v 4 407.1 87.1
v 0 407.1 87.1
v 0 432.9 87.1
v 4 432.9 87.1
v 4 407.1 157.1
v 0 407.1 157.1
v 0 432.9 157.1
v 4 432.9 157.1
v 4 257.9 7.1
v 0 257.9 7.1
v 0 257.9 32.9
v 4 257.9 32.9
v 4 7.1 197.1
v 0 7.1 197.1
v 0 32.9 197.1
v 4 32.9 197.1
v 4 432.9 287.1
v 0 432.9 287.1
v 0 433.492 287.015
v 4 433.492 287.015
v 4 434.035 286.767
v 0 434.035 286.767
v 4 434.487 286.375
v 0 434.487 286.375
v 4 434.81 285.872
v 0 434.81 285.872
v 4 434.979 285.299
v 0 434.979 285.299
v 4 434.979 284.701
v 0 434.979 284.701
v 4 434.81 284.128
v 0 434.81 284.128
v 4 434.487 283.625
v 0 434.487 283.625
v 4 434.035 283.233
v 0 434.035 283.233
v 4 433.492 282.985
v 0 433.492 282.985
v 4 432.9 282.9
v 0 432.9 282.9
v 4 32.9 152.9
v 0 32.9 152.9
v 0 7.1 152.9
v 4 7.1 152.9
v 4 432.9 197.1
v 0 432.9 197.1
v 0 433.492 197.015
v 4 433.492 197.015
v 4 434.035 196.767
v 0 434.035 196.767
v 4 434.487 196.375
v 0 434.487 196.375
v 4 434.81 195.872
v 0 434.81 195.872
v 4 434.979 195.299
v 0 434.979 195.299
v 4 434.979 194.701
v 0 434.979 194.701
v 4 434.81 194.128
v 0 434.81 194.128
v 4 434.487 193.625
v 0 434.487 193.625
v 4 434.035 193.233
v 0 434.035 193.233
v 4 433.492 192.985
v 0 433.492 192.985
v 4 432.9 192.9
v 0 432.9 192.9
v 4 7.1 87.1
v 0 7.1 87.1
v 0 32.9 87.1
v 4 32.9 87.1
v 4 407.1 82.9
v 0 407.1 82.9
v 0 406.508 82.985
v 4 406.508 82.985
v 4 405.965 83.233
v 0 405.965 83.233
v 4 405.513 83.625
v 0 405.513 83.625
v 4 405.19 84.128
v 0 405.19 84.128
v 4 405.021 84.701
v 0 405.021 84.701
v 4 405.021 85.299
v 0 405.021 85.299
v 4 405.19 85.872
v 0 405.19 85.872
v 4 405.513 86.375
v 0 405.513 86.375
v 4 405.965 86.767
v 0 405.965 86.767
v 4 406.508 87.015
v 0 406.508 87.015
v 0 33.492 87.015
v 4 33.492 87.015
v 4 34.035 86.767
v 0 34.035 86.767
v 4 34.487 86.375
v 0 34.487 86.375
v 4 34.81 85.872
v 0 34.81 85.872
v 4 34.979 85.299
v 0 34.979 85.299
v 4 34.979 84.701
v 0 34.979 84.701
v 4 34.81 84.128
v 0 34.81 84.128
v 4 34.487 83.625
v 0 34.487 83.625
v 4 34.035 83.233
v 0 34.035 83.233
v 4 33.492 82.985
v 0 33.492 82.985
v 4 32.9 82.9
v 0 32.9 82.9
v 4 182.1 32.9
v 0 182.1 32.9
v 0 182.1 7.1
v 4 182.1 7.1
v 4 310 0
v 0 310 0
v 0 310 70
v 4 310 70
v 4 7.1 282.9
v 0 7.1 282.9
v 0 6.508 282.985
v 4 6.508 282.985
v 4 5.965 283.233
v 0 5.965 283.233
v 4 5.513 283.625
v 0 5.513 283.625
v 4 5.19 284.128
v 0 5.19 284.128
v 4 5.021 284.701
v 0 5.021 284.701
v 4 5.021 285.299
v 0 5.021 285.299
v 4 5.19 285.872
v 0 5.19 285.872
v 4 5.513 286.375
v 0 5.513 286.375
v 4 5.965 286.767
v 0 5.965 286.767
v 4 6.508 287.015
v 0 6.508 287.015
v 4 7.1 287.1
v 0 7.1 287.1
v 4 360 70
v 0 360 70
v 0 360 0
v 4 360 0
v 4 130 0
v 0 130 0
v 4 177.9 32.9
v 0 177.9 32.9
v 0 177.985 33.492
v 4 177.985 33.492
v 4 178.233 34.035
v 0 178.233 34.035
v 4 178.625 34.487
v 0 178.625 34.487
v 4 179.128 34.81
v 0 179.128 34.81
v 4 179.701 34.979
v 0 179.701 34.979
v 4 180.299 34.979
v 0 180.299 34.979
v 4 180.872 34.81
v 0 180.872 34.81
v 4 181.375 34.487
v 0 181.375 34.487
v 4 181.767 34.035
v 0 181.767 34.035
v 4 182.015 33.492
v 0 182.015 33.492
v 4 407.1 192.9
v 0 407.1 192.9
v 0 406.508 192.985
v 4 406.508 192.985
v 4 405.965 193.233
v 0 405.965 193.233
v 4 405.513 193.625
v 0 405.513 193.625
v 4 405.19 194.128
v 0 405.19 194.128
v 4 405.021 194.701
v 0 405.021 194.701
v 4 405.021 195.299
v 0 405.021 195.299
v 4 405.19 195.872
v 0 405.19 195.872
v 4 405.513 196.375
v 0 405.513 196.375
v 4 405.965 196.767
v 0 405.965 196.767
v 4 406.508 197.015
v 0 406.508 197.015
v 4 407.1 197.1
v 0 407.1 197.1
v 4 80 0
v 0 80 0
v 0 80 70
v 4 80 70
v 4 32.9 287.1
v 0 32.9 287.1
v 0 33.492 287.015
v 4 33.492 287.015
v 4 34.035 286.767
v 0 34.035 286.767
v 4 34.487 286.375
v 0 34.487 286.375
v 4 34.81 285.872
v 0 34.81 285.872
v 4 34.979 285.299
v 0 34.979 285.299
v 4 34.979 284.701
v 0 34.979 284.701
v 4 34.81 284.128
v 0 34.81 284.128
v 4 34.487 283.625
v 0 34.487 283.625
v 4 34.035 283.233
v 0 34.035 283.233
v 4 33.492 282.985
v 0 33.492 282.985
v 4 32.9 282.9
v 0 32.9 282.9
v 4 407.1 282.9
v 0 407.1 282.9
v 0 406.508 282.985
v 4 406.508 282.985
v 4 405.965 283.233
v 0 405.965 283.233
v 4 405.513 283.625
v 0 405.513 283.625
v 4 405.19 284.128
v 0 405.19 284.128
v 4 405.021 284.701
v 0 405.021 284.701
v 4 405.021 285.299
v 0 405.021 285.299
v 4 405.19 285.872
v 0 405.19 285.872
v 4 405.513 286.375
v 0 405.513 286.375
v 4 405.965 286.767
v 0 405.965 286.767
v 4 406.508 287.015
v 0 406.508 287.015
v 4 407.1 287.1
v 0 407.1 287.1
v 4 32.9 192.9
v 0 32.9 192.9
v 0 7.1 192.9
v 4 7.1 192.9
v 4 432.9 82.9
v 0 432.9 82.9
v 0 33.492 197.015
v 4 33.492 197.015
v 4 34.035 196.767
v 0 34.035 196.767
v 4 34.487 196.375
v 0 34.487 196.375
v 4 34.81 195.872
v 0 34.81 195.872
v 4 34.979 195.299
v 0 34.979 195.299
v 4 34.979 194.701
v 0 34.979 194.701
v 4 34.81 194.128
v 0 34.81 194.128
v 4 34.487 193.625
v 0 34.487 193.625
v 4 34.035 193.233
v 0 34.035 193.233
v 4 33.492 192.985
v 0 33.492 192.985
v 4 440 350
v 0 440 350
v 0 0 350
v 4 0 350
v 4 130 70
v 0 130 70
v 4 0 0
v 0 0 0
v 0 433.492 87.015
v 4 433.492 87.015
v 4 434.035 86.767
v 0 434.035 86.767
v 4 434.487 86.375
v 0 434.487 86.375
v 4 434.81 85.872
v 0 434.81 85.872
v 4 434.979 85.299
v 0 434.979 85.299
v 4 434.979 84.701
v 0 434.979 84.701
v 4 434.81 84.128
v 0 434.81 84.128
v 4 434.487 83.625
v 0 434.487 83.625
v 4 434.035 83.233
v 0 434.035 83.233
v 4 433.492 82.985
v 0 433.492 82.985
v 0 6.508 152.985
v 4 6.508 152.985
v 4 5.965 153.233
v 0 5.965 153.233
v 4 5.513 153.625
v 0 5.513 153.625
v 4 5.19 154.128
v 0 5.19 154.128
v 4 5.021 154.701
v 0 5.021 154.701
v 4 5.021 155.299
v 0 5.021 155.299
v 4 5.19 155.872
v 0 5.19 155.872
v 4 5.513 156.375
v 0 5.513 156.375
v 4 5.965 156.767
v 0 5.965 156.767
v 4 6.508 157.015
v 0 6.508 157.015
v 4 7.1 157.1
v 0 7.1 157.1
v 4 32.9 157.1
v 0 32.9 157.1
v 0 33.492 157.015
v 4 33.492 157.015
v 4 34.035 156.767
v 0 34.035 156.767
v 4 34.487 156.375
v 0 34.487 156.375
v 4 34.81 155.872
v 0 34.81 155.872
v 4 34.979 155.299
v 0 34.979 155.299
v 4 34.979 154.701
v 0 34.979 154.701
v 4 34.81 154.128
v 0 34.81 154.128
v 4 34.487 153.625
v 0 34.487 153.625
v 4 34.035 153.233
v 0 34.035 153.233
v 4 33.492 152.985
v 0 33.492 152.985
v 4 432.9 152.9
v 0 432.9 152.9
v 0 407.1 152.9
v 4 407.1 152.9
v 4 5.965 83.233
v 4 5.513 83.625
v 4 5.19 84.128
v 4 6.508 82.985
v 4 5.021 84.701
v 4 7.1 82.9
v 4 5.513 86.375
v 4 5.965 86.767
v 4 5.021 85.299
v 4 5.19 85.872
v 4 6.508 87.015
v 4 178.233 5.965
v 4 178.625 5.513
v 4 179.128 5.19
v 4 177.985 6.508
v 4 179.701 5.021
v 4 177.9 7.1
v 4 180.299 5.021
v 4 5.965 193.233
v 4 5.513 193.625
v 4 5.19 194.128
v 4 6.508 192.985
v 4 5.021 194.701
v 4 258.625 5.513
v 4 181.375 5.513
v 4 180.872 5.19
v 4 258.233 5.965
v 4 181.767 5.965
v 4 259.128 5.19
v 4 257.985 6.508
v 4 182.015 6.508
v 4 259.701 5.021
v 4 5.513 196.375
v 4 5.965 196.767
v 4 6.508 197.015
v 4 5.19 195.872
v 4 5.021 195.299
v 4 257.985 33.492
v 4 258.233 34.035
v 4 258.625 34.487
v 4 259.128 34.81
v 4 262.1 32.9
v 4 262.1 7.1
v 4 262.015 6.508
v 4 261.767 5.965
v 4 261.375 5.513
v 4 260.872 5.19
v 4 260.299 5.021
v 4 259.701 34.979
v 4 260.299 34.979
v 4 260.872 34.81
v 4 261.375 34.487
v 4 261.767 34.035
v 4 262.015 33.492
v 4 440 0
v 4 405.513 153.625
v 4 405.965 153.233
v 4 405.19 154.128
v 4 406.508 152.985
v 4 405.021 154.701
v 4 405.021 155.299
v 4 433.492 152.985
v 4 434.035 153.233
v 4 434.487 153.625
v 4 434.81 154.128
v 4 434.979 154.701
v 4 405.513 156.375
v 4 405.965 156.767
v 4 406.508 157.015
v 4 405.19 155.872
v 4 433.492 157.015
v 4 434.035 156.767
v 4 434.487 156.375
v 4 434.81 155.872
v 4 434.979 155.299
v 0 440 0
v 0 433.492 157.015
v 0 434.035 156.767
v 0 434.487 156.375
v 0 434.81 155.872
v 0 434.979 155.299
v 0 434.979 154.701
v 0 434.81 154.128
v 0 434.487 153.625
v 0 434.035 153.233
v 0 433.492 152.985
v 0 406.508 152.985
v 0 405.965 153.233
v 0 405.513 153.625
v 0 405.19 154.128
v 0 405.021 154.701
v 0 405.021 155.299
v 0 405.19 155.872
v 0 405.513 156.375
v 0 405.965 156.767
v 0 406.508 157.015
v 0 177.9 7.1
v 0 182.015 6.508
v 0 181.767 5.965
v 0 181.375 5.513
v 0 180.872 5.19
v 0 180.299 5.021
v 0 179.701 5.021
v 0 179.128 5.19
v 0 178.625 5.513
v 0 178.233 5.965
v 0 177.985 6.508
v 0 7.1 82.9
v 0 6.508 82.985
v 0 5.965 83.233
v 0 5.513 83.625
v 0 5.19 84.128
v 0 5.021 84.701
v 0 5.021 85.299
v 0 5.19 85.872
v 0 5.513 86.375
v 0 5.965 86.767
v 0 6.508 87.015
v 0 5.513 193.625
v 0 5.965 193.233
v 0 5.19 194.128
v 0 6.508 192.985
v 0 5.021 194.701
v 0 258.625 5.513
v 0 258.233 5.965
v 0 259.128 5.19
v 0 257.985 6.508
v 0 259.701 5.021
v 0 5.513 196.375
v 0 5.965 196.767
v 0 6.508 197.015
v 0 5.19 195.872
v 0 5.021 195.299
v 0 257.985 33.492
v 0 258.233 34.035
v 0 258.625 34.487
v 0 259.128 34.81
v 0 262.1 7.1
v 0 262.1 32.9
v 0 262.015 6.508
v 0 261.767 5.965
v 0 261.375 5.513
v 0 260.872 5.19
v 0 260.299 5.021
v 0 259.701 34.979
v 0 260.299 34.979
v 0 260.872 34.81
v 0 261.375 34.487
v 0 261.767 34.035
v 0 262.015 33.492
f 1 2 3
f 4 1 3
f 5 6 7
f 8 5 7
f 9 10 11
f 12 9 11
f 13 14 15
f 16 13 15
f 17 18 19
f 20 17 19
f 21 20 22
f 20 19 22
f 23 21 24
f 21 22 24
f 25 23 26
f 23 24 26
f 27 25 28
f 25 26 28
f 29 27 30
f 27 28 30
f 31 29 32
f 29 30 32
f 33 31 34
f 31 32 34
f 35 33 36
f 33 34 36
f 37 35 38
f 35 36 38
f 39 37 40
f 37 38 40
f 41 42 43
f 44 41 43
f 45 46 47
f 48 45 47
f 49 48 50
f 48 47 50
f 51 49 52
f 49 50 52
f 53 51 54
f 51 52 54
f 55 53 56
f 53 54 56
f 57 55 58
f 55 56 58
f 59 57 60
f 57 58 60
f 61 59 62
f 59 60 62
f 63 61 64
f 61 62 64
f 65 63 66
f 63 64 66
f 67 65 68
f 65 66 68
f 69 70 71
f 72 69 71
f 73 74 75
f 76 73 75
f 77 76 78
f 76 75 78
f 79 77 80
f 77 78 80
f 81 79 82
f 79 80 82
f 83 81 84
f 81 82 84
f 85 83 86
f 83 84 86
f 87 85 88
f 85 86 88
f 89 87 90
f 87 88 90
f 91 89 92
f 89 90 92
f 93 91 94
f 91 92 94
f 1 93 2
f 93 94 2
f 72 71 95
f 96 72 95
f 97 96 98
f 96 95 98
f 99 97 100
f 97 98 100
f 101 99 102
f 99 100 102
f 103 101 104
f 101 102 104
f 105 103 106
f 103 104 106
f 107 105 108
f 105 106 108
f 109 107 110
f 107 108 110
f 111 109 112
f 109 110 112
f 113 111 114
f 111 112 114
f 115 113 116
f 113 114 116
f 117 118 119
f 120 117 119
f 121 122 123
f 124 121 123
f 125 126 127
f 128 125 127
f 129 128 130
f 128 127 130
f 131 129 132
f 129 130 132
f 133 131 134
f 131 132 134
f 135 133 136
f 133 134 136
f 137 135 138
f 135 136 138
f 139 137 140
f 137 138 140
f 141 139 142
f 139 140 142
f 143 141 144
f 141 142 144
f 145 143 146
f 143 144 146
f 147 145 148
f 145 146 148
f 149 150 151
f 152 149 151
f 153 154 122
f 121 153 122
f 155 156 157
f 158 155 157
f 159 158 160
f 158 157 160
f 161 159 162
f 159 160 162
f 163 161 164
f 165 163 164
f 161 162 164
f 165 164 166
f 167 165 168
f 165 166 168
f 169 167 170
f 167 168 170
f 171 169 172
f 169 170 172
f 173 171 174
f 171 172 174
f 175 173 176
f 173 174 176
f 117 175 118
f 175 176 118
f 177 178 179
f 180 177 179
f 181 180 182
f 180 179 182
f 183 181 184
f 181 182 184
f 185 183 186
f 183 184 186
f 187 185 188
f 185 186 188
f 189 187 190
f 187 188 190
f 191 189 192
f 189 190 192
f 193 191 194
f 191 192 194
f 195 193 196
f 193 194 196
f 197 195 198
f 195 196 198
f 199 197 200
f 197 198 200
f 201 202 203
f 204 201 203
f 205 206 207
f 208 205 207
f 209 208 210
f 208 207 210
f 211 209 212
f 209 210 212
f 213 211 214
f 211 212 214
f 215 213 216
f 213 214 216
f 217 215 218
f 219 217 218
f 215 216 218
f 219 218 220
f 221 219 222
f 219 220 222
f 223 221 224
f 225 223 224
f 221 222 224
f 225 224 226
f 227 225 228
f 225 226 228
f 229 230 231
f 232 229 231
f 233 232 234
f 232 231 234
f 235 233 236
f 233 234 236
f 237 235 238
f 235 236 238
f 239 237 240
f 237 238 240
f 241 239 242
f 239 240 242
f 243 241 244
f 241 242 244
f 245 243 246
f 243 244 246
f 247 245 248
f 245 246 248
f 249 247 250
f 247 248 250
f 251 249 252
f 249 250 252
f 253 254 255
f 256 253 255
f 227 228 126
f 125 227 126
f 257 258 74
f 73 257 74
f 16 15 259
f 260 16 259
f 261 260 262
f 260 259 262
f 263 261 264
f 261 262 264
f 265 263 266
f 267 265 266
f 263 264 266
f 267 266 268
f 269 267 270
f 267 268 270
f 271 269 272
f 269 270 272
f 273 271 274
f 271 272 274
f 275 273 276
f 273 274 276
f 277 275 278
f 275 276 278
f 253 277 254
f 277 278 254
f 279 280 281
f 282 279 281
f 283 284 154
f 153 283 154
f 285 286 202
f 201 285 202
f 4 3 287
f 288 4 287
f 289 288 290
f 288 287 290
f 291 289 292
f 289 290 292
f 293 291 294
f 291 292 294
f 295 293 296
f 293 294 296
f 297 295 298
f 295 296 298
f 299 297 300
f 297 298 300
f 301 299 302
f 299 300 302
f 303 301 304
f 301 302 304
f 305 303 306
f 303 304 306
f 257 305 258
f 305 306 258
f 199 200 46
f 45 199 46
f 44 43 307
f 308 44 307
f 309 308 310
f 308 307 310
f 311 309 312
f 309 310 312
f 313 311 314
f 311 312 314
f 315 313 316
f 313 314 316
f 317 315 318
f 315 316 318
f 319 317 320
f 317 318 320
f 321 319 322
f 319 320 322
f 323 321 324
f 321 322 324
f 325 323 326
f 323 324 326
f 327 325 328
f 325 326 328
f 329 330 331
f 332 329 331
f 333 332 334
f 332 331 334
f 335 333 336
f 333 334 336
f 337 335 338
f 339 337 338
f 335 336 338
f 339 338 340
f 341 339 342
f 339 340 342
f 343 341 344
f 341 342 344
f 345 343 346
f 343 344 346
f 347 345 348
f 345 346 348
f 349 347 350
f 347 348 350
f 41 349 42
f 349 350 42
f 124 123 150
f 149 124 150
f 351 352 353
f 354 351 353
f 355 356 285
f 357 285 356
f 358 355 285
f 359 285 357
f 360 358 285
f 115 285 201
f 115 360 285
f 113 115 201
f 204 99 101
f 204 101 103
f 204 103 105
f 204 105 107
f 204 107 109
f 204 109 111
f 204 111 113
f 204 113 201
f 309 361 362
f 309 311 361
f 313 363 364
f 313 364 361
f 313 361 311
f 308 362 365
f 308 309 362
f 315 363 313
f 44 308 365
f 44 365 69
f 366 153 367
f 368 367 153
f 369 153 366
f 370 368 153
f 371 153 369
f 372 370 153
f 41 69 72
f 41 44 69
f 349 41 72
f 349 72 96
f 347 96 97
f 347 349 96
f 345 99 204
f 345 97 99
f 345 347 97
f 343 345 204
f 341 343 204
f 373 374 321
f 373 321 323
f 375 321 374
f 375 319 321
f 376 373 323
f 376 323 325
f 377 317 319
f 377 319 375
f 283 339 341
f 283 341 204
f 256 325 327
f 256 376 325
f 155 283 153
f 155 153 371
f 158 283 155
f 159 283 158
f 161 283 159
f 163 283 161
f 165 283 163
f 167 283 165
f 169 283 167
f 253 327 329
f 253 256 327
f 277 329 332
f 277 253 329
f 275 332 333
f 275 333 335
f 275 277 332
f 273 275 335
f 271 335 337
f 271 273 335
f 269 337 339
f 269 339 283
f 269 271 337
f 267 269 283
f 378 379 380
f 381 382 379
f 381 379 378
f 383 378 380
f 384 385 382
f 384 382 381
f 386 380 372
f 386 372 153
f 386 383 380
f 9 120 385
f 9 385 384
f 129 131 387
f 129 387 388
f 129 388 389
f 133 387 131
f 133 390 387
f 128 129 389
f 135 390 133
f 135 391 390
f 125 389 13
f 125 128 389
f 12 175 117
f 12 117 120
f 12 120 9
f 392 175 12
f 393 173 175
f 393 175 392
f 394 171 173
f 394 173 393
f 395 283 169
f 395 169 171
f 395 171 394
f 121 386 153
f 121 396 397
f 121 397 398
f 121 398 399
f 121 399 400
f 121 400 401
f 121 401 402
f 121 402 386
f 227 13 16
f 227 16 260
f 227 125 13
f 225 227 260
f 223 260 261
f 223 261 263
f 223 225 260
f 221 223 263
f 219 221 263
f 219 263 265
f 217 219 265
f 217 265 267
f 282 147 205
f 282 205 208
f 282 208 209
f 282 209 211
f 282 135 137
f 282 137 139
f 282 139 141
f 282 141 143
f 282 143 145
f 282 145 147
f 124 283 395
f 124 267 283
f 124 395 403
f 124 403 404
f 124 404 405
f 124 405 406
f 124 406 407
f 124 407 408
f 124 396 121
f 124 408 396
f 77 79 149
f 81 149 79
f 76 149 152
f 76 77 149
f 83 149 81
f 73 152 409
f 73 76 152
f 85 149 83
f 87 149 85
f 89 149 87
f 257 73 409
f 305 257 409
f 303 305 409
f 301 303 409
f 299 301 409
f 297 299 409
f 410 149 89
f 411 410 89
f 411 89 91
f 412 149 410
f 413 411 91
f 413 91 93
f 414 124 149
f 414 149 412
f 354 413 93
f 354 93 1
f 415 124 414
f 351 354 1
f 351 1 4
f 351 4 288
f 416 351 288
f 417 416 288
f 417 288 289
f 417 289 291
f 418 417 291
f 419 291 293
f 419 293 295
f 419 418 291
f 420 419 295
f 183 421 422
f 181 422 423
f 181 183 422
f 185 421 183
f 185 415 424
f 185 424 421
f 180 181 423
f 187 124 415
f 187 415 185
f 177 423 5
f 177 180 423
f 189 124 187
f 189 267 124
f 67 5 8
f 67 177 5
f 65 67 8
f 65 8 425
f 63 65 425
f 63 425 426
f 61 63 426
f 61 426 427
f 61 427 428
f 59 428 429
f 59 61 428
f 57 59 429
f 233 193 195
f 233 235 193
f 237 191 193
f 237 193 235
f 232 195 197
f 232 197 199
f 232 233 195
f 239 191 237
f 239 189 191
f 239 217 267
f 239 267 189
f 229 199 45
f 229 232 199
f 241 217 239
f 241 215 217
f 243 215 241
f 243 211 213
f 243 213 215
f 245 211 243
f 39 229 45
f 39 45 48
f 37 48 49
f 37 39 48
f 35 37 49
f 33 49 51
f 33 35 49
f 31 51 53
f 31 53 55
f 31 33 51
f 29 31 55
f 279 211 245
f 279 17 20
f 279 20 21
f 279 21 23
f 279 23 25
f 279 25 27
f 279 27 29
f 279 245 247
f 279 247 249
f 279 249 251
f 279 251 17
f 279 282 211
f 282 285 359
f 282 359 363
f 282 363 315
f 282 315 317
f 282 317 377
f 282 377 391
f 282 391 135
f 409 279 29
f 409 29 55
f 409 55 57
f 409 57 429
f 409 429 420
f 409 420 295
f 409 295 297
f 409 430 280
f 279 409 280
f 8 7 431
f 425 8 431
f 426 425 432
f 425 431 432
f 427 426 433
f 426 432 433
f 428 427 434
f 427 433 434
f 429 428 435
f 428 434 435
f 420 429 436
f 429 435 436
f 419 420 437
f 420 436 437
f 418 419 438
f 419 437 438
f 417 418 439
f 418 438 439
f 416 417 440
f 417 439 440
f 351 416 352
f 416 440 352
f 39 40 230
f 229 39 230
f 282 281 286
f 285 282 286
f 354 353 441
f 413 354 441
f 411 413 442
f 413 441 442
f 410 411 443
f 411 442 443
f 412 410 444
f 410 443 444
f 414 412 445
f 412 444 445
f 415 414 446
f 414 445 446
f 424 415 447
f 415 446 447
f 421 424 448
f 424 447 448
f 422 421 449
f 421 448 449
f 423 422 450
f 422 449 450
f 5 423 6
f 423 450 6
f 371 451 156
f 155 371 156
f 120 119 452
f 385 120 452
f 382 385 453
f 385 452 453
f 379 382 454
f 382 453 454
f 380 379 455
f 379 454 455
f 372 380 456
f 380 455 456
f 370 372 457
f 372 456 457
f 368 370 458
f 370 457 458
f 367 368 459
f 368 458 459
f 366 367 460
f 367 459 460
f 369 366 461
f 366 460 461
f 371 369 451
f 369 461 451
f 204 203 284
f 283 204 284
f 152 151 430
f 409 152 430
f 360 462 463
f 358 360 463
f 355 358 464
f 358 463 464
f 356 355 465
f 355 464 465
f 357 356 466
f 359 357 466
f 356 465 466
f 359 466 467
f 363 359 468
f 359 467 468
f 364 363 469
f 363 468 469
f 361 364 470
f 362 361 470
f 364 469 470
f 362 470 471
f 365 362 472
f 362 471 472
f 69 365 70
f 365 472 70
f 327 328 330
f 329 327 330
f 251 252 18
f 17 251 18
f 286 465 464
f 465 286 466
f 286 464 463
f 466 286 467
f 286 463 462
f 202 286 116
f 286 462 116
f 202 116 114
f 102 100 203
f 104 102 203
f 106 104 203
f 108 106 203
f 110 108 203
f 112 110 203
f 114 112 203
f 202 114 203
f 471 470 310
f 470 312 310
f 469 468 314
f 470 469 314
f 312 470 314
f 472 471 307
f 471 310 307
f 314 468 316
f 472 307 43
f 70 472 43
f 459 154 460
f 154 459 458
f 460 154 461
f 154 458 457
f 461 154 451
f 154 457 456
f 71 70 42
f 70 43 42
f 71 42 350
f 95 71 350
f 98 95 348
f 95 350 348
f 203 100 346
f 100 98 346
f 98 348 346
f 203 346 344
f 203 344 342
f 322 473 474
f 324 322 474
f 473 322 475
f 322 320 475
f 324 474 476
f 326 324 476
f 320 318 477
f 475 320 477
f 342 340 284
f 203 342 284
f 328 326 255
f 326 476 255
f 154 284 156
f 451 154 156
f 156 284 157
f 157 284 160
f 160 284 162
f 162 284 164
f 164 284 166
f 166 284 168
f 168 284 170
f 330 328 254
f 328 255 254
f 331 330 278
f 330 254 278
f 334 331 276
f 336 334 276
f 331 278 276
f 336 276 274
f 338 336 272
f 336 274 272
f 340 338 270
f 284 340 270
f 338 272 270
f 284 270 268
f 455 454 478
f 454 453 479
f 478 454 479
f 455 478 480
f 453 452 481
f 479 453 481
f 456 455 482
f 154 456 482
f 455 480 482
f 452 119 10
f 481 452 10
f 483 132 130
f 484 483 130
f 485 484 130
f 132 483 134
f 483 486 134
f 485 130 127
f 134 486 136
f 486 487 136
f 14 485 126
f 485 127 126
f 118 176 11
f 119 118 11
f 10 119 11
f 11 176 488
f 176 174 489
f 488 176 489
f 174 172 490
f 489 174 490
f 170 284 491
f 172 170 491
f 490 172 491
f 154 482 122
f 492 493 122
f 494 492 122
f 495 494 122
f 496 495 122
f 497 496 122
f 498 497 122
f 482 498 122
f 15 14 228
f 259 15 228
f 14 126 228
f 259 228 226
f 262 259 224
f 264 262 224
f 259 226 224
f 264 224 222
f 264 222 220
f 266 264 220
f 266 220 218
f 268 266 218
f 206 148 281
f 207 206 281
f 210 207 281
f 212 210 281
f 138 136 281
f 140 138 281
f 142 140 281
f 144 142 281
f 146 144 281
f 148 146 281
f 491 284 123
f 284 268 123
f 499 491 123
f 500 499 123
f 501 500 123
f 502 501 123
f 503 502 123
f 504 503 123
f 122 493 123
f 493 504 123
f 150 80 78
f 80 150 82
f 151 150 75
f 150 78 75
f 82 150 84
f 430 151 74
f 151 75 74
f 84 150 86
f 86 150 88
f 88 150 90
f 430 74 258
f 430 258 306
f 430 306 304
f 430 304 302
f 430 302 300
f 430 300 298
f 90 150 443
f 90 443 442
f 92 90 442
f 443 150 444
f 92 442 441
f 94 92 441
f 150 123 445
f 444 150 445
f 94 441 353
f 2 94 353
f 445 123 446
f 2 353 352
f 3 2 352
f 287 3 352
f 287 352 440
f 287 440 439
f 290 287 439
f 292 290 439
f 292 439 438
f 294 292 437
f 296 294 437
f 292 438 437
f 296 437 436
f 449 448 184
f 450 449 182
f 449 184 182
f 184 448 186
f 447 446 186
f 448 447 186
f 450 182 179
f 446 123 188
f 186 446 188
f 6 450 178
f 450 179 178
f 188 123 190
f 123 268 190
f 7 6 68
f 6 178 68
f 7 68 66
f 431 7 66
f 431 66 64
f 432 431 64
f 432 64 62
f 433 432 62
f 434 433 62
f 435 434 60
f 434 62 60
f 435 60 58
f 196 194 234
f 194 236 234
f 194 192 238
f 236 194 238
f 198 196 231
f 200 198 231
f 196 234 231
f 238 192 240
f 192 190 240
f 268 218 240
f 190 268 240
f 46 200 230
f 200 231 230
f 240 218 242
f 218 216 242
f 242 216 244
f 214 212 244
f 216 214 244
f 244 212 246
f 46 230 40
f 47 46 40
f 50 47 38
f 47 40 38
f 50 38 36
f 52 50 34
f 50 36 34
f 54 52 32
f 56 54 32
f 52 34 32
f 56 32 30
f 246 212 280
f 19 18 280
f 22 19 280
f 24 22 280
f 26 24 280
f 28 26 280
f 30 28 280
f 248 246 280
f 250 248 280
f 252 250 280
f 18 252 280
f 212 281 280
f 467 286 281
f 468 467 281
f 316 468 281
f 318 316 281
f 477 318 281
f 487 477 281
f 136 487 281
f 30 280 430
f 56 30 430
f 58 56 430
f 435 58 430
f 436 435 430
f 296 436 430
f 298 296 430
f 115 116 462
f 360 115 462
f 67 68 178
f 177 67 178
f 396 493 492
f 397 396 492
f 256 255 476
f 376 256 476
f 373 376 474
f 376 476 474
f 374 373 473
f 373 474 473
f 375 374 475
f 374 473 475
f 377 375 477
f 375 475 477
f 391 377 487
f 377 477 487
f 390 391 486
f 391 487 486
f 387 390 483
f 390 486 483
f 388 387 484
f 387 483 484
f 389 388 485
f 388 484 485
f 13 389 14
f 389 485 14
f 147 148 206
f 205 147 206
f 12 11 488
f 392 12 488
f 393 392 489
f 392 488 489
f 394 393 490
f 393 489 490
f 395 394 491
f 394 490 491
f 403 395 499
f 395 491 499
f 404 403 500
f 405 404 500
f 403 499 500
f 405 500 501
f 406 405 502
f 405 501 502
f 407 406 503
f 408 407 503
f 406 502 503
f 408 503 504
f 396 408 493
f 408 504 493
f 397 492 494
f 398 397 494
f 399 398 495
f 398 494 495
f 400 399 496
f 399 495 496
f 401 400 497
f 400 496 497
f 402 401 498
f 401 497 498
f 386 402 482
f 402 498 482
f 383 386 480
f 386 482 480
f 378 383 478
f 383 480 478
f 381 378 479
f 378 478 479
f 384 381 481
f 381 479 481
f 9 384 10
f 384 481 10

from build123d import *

# Parameters (mm, degrees)
BOSS_EXTRUDE1_DEPTH = 4


with BuildPart() as part:
    # Sketch1 → Boss-Extrude1 (new body)
    with BuildSketch(Plane.YZ):
        Polygon((0, 350), (0, 0), (80, 0), (80, 70), (130, 70), (130, 0), (310, 0), (310, 70), (360, 70), (360, 0), (440, 0), (440, 350), align=None)
        with BuildLine():
            Line((7.1, 87.1), (32.9, 87.1))
            ThreePointArc((32.9, 87.1), (35, 85), (32.9, 82.9))
            Line((32.9, 82.9), (7.1, 82.9))
            ThreePointArc((7.1, 82.9), (5, 85), (7.1, 87.1))
        make_face(mode=Mode.SUBTRACT)
        with BuildLine():
            Line((177.9, 7.1), (177.9, 32.9))
            ThreePointArc((177.9, 32.9), (180, 35), (182.1, 32.9))
            Line((182.1, 32.9), (182.1, 7.1))
            ThreePointArc((182.1, 7.1), (180, 5), (177.9, 7.1))
        make_face(mode=Mode.SUBTRACT)
        with BuildLine():
            ThreePointArc((32.9, 157.1), (35, 155), (32.9, 152.9))
            Line((32.9, 152.9), (7.1, 152.9))
            ThreePointArc((7.1, 152.9), (5, 155), (7.1, 157.1))
            Line((7.1, 157.1), (32.9, 157.1))
        make_face(mode=Mode.SUBTRACT)
        with BuildLine():
            ThreePointArc((257.9, 32.9), (260, 35), (262.1, 32.9))
            Line((262.1, 32.9), (262.1, 7.1))
            ThreePointArc((262.1, 7.1), (260, 5), (257.9, 7.1))
            Line((257.9, 7.1), (257.9, 32.9))
        make_face(mode=Mode.SUBTRACT)
        with BuildLine():
            ThreePointArc((407.1, 82.9), (405, 85), (407.1, 87.1))
            Line((407.1, 87.1), (432.9, 87.1))
            ThreePointArc((432.9, 87.1), (435, 85), (432.9, 82.9))
            Line((432.9, 82.9), (407.1, 82.9))
        make_face(mode=Mode.SUBTRACT)
        with BuildLine():
            Line((432.9, 152.9), (407.1, 152.9))
            ThreePointArc((407.1, 152.9), (405, 155), (407.1, 157.1))
            Line((407.1, 157.1), (432.9, 157.1))
            ThreePointArc((432.9, 157.1), (435, 155), (432.9, 152.9))
        make_face(mode=Mode.SUBTRACT)
        with BuildLine():
            Line((7.1, 197.1), (32.9, 197.1))
            ThreePointArc((32.9, 197.1), (35, 195), (32.9, 192.9))
            Line((32.9, 192.9), (7.1, 192.9))
            ThreePointArc((7.1, 192.9), (5, 195), (7.1, 197.1))
        make_face(mode=Mode.SUBTRACT)
        with BuildLine():
            ThreePointArc((32.9, 287.1), (35, 285), (32.9, 282.9))
            Line((32.9, 282.9), (7.1, 282.9))
            ThreePointArc((7.1, 282.9), (5, 285), (7.1, 287.1))
            Line((7.1, 287.1), (32.9, 287.1))
        make_face(mode=Mode.SUBTRACT)
        with BuildLine():
            ThreePointArc((407.1, 192.9), (405, 195), (407.1, 197.1))
            Line((407.1, 197.1), (432.9, 197.1))
            ThreePointArc((432.9, 197.1), (435, 195), (432.9, 192.9))
            Line((432.9, 192.9), (407.1, 192.9))
        make_face(mode=Mode.SUBTRACT)
        with BuildLine():
            Line((432.9, 282.9), (407.1, 282.9))
            ThreePointArc((407.1, 282.9), (405, 285), (407.1, 287.1))
            Line((407.1, 287.1), (432.9, 287.1))
            ThreePointArc((432.9, 287.1), (435, 285), (432.9, 282.9))
        make_face(mode=Mode.SUBTRACT)
    extrude(amount=BOSS_EXTRUDE1_DEPTH)


solid = part.part
